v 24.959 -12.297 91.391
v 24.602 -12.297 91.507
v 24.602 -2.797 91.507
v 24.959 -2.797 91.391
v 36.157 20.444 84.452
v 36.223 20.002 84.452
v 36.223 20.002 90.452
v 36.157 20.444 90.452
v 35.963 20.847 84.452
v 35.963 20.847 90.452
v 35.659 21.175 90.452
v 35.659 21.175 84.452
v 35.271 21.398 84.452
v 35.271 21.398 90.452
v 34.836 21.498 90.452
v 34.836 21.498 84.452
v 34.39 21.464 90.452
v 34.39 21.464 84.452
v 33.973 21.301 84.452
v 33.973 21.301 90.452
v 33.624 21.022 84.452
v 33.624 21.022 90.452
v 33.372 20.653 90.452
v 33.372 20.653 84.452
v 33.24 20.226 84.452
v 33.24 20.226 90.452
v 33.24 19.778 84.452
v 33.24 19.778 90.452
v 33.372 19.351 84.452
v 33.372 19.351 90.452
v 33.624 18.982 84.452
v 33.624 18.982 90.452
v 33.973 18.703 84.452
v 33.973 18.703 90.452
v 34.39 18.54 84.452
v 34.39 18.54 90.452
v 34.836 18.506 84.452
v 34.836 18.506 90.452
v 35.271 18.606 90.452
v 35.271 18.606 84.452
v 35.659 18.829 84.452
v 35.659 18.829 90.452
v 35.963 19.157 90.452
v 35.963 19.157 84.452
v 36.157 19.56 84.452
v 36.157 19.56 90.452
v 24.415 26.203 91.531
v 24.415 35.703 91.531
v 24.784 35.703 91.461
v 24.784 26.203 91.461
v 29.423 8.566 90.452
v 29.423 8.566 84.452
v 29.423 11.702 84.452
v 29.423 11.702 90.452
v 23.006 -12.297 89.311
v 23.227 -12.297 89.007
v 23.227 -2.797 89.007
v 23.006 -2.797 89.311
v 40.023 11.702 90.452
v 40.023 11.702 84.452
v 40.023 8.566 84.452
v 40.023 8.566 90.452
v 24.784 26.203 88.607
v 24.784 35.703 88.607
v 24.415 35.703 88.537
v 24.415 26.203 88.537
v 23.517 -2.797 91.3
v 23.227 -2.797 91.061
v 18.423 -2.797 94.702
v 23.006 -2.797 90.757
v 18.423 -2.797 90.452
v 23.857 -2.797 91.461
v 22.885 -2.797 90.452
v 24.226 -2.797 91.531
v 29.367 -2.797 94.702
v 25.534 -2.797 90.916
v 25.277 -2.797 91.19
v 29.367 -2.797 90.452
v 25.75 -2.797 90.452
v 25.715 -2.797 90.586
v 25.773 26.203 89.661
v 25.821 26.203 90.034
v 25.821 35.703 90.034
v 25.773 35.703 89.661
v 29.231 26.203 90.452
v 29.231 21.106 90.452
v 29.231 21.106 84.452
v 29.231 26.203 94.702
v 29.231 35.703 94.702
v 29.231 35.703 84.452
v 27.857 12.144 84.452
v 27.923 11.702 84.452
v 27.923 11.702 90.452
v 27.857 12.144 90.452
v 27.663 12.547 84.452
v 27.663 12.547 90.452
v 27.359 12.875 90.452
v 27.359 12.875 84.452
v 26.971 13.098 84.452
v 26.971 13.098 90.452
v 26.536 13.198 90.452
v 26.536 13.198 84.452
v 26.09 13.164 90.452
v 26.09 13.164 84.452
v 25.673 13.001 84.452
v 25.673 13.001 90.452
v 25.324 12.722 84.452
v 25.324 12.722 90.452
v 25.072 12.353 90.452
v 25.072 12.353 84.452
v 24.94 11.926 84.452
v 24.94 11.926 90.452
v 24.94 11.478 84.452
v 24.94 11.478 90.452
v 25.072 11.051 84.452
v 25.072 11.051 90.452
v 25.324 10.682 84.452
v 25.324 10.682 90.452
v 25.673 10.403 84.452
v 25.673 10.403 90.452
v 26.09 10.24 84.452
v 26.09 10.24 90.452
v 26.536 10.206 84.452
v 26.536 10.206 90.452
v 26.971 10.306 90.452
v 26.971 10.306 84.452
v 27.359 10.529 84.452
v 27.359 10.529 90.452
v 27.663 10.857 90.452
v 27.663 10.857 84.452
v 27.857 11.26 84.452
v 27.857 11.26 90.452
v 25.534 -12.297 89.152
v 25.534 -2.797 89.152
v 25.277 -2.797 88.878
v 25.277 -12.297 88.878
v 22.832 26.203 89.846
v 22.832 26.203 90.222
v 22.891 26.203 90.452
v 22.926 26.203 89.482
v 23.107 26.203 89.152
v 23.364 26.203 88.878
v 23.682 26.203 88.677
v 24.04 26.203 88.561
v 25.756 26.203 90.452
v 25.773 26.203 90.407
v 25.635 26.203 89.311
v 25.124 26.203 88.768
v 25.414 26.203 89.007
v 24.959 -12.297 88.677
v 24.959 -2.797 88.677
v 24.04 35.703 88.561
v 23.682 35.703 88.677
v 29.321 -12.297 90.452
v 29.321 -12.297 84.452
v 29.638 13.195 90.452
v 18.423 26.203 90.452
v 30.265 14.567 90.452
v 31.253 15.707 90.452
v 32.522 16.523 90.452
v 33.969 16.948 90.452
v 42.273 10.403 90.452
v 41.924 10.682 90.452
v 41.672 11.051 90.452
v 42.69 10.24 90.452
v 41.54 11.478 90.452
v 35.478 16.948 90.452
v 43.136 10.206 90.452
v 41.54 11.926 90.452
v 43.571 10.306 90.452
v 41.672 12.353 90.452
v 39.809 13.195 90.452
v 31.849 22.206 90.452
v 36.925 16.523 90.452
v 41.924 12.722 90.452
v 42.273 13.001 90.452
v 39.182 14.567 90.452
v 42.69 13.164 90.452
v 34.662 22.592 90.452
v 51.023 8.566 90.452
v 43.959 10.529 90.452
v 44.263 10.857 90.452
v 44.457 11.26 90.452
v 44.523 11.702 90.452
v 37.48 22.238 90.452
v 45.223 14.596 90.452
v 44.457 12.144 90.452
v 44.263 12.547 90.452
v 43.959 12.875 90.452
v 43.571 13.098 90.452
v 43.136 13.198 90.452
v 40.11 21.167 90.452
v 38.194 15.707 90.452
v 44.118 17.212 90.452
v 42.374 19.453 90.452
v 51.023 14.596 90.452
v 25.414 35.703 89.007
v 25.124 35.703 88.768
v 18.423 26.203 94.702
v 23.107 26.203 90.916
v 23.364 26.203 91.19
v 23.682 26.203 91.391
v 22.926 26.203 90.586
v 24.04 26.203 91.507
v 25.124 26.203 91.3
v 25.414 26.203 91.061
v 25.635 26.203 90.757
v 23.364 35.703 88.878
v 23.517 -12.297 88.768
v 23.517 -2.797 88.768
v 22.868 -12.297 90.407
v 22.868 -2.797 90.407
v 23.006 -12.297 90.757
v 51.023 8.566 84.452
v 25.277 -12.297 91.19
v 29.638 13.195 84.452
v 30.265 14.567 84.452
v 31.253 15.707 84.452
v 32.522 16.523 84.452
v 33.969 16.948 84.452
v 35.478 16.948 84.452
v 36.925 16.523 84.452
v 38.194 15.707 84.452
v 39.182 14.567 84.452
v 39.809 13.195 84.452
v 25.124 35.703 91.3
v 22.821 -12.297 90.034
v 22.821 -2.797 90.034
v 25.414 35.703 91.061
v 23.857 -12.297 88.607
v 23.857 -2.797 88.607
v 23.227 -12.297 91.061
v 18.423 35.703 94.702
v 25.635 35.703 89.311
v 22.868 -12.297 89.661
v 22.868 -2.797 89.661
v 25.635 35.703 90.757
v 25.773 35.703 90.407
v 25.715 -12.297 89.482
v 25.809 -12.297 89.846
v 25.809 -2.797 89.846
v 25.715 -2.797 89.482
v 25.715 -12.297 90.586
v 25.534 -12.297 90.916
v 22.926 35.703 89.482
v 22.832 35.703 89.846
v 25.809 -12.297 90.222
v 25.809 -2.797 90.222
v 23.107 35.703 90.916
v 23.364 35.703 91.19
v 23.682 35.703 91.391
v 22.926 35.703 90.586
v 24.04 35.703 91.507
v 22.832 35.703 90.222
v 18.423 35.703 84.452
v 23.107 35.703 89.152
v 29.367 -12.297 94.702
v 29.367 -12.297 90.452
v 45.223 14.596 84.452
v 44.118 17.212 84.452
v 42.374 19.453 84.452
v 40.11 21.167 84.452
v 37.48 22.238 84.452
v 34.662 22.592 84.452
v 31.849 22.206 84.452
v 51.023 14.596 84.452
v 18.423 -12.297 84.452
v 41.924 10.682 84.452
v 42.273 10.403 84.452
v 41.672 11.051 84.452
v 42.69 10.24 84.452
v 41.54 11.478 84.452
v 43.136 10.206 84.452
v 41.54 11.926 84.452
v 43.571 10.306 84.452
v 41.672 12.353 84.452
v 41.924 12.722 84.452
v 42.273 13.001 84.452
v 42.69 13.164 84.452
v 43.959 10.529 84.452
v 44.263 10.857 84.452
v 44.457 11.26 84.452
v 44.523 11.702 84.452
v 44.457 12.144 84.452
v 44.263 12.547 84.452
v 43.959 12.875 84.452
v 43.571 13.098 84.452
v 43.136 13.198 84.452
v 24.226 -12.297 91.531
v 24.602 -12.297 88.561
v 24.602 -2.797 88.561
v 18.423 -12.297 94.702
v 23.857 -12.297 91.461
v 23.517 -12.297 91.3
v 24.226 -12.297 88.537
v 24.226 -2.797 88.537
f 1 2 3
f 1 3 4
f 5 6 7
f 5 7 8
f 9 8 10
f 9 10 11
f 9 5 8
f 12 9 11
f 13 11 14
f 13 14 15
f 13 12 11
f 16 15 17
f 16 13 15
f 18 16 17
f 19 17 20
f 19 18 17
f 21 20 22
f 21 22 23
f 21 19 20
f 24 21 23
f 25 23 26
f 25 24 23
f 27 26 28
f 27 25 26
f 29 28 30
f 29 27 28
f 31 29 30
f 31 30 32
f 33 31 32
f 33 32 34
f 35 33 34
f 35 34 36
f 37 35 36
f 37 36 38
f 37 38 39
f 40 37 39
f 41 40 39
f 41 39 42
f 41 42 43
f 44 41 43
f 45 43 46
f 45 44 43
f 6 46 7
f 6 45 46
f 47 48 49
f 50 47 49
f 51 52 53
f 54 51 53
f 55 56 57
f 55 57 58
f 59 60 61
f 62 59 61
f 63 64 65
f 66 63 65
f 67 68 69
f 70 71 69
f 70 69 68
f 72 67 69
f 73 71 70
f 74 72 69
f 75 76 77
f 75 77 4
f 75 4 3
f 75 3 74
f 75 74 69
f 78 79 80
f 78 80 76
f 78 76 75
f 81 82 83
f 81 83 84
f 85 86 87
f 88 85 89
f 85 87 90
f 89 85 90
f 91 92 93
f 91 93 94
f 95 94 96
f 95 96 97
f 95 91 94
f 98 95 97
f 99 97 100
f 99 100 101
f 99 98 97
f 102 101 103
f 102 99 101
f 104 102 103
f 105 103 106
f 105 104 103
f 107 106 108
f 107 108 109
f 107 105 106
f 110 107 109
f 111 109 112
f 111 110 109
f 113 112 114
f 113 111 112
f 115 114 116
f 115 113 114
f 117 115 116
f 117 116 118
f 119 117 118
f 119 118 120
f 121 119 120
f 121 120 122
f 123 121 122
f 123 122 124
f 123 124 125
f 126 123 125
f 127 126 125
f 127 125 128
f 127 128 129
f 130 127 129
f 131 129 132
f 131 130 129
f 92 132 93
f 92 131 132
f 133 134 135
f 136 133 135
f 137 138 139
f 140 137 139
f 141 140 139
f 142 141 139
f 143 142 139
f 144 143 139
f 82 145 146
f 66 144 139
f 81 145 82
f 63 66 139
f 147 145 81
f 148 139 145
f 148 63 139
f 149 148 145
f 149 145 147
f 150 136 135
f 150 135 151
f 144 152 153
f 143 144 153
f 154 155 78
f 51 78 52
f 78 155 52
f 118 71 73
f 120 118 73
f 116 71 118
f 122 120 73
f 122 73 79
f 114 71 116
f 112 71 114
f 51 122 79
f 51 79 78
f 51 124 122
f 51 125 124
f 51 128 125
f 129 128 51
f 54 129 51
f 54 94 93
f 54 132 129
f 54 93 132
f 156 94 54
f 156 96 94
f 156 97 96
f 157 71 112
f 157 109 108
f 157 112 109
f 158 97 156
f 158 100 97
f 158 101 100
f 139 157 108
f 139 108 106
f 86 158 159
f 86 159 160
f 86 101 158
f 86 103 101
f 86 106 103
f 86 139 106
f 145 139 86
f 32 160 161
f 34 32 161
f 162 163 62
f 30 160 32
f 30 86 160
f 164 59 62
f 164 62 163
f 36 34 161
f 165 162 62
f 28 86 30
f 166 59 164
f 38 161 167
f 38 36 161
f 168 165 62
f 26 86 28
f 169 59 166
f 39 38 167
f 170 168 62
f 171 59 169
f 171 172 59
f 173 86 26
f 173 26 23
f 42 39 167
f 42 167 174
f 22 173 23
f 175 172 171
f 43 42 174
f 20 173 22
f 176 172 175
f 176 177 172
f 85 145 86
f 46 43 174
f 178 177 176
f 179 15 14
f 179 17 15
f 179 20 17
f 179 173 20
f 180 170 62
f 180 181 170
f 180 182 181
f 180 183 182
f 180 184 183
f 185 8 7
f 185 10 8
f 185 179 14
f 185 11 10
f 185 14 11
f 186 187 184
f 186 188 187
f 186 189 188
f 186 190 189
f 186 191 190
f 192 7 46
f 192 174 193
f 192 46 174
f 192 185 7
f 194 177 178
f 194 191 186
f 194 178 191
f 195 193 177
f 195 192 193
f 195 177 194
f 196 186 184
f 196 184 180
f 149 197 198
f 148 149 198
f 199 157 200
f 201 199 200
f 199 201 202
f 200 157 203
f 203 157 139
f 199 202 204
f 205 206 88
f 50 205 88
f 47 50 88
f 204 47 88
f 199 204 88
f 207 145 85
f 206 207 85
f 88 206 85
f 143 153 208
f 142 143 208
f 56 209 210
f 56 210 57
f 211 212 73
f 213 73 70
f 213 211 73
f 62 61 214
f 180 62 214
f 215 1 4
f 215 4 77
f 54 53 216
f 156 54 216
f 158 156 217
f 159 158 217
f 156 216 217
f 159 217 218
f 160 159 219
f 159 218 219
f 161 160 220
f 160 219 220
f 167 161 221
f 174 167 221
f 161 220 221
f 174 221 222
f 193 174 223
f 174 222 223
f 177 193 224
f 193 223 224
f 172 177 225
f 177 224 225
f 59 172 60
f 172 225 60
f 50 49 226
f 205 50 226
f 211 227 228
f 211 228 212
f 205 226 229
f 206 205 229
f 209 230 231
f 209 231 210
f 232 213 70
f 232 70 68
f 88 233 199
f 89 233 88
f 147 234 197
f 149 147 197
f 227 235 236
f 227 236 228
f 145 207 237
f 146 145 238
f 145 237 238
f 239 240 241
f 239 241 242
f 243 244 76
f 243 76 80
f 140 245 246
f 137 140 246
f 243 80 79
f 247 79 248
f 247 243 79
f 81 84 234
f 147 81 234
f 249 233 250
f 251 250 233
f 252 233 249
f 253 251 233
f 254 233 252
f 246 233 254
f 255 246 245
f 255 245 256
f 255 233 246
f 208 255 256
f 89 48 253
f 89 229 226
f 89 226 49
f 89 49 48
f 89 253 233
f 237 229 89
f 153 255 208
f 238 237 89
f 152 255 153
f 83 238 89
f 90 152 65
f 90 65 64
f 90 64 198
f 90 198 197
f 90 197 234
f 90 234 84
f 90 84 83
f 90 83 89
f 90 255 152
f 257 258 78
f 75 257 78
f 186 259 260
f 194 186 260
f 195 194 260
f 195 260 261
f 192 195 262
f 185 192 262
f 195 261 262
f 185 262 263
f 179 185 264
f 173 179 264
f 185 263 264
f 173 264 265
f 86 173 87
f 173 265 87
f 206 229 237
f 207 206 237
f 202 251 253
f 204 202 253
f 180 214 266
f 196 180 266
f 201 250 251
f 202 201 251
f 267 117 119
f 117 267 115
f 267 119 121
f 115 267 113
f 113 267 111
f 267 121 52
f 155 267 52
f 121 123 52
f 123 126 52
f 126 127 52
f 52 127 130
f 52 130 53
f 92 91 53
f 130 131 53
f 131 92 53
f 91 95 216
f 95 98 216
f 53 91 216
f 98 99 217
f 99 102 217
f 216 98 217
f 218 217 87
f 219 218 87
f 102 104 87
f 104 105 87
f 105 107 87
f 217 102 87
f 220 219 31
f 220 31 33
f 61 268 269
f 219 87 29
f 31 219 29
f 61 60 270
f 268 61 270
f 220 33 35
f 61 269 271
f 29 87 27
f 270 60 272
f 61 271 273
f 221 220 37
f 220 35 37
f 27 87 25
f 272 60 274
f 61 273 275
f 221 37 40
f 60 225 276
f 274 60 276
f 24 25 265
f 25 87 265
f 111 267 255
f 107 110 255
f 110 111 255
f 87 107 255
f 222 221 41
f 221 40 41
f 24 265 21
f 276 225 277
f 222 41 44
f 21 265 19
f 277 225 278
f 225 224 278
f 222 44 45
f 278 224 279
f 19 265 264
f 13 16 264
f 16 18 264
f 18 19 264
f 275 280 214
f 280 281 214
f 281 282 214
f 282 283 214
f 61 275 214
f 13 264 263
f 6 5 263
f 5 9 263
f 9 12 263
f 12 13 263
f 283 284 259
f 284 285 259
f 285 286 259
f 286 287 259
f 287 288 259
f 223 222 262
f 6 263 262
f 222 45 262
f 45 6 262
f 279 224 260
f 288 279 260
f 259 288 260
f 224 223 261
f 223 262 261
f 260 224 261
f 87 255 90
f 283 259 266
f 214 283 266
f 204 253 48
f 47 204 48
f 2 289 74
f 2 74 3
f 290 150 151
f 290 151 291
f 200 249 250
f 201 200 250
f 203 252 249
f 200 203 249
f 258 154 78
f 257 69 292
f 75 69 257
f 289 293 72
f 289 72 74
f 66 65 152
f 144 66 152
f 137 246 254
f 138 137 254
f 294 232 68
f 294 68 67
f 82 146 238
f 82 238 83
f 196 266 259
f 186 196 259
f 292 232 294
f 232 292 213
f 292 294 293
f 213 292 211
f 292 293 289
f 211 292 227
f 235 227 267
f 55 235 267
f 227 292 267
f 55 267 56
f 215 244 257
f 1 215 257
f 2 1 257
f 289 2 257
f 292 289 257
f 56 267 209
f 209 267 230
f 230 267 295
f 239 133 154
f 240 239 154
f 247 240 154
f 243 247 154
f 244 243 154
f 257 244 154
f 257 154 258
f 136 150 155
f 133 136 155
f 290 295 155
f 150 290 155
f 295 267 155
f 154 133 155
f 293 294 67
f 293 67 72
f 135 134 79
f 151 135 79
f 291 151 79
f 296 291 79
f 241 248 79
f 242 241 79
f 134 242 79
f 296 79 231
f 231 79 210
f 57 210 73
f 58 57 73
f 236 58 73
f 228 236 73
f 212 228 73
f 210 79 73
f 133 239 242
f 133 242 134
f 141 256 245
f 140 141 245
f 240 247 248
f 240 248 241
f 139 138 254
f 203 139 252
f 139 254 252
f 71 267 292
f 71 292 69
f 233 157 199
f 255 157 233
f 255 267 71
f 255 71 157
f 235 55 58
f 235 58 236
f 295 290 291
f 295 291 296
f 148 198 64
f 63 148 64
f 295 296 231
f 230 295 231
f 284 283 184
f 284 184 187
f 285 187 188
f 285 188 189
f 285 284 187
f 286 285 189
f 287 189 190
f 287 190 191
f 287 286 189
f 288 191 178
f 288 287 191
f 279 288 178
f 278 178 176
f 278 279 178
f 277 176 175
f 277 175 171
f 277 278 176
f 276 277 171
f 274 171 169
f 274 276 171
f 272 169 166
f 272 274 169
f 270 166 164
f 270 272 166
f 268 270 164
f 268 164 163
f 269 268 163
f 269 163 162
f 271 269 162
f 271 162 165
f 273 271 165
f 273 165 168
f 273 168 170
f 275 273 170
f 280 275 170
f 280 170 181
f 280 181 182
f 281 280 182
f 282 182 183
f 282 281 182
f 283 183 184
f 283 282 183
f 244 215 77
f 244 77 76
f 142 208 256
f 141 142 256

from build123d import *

# Parameters (mm, degrees)
SKETCH1_R           = 1.5
BOSS_EXTRUDE1_DEPTH = 6
SKETCH2_W           = 10.807687298
SKETCH2_H           = 9.5
SKETCH2_W_2         = 10.943994224
BOSS_EXTRUDE2_DEPTH = 4.25
CUT_EXTRUDE1_DEPTH  = 9.5
CUT_EXTRUDE2_DEPTH  = 9.5


with BuildPart() as part:
    # Sketch1 → Boss-Extrude1 (new body)
    with BuildSketch(Plane.XY.offset(84.451608182)):
        with BuildLine():
            Line((40.02344809, 11.701998712), (40.02344809, 8.566491131))
            Line((40.02344809, 8.566491131), (47.02344809, 8.566491131))
            Line((47.02344809, 8.566491131), (51.02344809, 8.566491131))
            Line((51.02344809, 8.566491131), (51.02344809, 14.59568261))
            Line((51.02344809, 14.59568261), (45.222644144, 14.59568261))
            ThreePointArc((45.222644144, 14.59568261), (38.830062222, 21.788734788), (29.231135388, 21.10630759))
            Line((29.231135388, 21.10630759), (29.231135388, 35.703275576))
            Line((29.231135388, 35.703275576), (18.42344809, 35.703275576))
            Line((18.42344809, 35.703275576), (18.42344809, 14.59568261))
            Line((18.42344809, 14.59568261), (18.42344809, 8.566491131))
            Line((18.42344809, 8.566491131), (18.42344809, -12.296724841))
            Line((18.42344809, -12.296724841), (29.320619754, -12.296724841))
            Line((29.320619754, -12.296724841), (29.42344809, 8.566491131))
            Line((29.42344809, 8.566491131), (29.42344809, 11.701998712))
            ThreePointArc((29.42344809, 11.701998712), (34.72344809, 17.001998712), (40.02344809, 11.701998712))
        make_face()
        with Locations((43.02344809, 11.701998712)):
            Circle(SKETCH1_R, mode=Mode.SUBTRACT)
        with Locations((26.42344809, 11.701998712)):
            Circle(SKETCH1_R, mode=Mode.SUBTRACT)
        with Locations((34.72344809, 20.001998712)):
            Circle(SKETCH1_R, mode=Mode.SUBTRACT)
    extrude(amount=BOSS_EXTRUDE1_DEPTH)

    # Sketch2 → Boss-Extrude2 (add)
    with BuildSketch(Plane.XY.offset(90.451608182)):
        with Locations((23.827291739, 30.953275576)):
            Rectangle(SKETCH2_W, SKETCH2_H)
        with Locations((23.895445202, -7.546724841)):
            Rectangle(SKETCH2_W_2, SKETCH2_H)
    extrude(amount=BOSS_EXTRUDE2_DEPTH)

    # Sketch3 → Cut-Extrude1 (cut)
    with BuildSketch(Plane(origin=(0, 35.703275576, 0), x_dir=(1, 0, 0), z_dir=(0, 1, 0))):
        Polygon((24.039543919, -91.507423883), (24.414807311, -91.53103291), (24.784140042, -91.460577426), (25.124363355, -91.300484473), (25.414071731, -91.060813265), (25.635078303, -90.756623289), (25.773495189, -90.407027611), (25.820620111, -90.033992408), (25.773495189, -89.660958601), (25.635078303, -89.311362458), (25.414071731, -89.007172948), (25.124363355, -88.767500808), (24.784140042, -88.607407389), (24.414807311, -88.536952836), (24.039543919, -88.560561864), (23.681945852, -88.676751805), (23.364484064, -88.878222024), (23.107096306, -89.152314914), (22.925957791, -89.481805665), (22.832445554, -89.845992839), (22.832445554, -90.221992442), (22.925957791, -90.586179616), (23.107096306, -90.915670833), (23.364484064, -91.189762792), (23.681945852, -91.391233476), align=None)
    extrude(amount=-CUT_EXTRUDE1_DEPTH, mode=Mode.SUBTRACT)

    # Sketch4 → Cut-Extrude2 (cut)
    with BuildSketch(Plane.XZ.offset(12.296724841)):
        Polygon((25.27675753, 88.878222024), (24.959288291, 88.676751805), (24.601690225, 88.560561864), (24.226434282, 88.536952836), (23.857094101, 88.607407389), (23.516878239, 88.767500808), (23.227169863, 89.007172948), (23.00615584, 89.311362458), (22.867746405, 89.660958601), (22.820621482, 90.033992408), (22.867746405, 90.407027611), (23.00615584, 90.756623289), (23.227169863, 91.060813265), (23.516878239, 91.300484473), (23.857094101, 91.460577426), (24.226434282, 91.53103291), (24.601690225, 91.507423883), (24.959288291, 91.391233476), (25.27675753, 91.189762792), (25.534145287, 90.915670833), (25.715283803, 90.586179616), (25.80879604, 90.221992442), (25.80879604, 89.845992839), (25.715283803, 89.481805665), (25.534145287, 89.152314914), align=None)
    extrude(amount=-CUT_EXTRUDE2_DEPTH, mode=Mode.SUBTRACT)


solid = part.part
